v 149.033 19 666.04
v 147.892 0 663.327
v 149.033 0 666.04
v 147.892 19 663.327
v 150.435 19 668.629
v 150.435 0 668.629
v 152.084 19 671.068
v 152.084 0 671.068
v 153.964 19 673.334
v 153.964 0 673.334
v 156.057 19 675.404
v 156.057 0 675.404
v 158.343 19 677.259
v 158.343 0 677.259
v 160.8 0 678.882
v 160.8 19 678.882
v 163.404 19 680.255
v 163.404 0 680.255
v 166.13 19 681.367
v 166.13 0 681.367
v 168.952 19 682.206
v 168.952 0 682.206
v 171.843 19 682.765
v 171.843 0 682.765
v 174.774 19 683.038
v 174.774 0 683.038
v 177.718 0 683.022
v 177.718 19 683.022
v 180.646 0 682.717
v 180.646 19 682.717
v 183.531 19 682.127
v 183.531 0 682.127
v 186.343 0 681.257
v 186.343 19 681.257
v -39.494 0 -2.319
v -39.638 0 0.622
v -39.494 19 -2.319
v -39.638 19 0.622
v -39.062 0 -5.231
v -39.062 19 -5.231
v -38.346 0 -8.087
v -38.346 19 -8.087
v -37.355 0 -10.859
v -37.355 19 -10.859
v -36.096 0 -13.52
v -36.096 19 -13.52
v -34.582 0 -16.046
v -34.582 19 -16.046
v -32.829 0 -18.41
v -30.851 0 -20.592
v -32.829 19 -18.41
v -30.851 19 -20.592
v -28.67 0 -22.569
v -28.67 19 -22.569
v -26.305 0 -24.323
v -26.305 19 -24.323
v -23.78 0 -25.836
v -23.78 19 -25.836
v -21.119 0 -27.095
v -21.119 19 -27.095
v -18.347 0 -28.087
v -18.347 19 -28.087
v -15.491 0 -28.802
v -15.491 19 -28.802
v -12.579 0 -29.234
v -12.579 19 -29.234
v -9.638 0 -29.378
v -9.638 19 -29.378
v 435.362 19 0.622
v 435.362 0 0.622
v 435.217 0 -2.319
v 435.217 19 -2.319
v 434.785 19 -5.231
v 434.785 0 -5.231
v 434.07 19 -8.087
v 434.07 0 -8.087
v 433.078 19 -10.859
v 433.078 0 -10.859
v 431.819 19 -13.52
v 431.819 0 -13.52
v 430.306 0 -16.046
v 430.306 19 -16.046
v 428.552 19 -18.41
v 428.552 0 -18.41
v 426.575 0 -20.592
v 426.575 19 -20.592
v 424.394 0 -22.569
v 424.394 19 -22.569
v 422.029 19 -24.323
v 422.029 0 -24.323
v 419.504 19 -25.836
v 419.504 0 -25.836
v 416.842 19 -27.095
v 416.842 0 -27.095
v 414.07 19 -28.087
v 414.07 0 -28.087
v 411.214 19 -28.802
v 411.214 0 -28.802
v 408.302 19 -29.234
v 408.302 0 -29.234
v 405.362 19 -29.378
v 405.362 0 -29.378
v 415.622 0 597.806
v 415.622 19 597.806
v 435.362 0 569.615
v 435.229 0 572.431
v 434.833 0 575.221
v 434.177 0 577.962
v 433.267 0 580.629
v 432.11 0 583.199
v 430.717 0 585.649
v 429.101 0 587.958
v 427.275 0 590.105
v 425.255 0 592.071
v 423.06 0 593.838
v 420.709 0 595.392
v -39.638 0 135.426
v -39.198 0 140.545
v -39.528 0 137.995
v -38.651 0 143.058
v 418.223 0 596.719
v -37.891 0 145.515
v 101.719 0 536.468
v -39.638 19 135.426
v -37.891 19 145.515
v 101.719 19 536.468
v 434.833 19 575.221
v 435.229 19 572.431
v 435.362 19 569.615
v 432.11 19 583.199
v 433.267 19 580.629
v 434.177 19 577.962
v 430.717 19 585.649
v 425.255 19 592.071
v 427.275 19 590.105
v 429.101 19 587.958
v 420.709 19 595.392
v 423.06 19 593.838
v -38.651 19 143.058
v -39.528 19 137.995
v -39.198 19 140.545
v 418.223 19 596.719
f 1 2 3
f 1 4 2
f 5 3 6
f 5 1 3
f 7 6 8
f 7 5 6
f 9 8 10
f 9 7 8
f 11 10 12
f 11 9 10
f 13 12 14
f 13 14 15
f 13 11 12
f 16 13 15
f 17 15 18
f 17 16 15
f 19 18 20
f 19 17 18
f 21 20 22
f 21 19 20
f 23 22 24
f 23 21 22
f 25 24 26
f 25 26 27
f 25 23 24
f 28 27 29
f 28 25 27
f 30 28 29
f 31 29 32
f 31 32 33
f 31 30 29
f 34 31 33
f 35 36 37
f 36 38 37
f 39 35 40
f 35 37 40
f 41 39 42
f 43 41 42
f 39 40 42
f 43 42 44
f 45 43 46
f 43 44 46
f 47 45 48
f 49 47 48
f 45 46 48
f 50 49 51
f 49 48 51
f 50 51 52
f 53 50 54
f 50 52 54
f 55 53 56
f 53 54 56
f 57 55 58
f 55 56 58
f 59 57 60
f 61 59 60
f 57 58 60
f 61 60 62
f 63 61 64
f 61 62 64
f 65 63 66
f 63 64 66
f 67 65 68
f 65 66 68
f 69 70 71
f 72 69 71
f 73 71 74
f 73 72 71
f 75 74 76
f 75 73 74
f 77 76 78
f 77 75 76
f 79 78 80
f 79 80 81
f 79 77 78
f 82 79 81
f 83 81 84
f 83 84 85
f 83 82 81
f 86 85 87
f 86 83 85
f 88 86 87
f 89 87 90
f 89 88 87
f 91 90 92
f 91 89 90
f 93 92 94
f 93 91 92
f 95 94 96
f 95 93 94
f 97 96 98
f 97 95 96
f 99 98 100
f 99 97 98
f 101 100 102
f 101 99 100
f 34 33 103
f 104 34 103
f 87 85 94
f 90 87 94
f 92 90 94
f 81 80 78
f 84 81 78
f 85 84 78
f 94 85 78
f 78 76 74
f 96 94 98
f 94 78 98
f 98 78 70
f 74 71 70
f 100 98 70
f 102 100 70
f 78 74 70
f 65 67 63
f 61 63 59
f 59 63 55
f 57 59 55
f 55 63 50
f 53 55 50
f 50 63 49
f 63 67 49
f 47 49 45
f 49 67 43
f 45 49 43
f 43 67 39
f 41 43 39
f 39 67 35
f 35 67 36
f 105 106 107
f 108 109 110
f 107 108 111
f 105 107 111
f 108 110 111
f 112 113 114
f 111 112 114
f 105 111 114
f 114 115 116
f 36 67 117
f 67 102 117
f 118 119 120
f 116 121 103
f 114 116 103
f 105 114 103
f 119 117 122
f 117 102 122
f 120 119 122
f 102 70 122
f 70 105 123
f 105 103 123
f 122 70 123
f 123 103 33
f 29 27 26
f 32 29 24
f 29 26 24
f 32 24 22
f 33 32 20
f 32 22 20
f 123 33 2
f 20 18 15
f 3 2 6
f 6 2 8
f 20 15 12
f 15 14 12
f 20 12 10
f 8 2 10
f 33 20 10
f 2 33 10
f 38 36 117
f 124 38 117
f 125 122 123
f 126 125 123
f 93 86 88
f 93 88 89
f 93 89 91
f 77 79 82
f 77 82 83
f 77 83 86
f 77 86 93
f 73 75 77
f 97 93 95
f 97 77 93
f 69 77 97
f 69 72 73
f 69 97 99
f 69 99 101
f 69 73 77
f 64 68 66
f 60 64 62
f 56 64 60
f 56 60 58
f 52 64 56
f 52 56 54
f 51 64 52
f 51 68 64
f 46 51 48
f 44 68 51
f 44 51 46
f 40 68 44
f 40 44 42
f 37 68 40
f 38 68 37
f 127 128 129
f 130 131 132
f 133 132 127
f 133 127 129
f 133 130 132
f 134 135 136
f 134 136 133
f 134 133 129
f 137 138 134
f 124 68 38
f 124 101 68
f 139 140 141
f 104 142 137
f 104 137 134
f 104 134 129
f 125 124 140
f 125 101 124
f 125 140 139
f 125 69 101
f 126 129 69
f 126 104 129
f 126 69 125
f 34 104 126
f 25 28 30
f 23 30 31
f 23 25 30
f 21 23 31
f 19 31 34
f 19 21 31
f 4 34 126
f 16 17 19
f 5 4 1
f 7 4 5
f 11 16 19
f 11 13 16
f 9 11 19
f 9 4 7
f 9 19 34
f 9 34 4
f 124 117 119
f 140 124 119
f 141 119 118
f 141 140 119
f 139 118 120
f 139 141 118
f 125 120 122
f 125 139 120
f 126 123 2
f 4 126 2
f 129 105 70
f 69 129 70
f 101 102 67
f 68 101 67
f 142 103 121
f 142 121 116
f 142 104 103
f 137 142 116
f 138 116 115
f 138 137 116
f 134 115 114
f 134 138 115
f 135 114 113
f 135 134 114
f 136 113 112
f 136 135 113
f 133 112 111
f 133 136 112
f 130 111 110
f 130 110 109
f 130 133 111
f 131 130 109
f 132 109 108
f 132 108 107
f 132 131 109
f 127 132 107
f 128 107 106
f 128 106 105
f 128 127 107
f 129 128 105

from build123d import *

# Parameters (mm, degrees)
PAD_DEPTH = 19
FILLET_R  = 30


with BuildPart() as part:
    # Sketch001 → Pad (new body)
    with BuildSketch(Plane.XZ):
        Polygon((-39.638222, -29.378442), (-39.638222, 140.621558), (101.719132, 536.468218), (158.152455, 691.5175), (435.361778, 590.621558), (435.361778, -29.378442), align=None)
    extrude(amount=-PAD_DEPTH)

    # Fillet
    fillet_edges = [part.edges().sort_by_distance(p)[0] for p in [
        (-39.638222, 9.5, 140.621558),
        (-39.638222, 9.5, -29.378442),
        (158.152455, 9.5, 691.5175),
        (435.361778, 9.5, 590.621558),
        (435.361778, 9.5, -29.378442),
    ]]
    fillet(fillet_edges, radius=FILLET_R)


solid = part.part
